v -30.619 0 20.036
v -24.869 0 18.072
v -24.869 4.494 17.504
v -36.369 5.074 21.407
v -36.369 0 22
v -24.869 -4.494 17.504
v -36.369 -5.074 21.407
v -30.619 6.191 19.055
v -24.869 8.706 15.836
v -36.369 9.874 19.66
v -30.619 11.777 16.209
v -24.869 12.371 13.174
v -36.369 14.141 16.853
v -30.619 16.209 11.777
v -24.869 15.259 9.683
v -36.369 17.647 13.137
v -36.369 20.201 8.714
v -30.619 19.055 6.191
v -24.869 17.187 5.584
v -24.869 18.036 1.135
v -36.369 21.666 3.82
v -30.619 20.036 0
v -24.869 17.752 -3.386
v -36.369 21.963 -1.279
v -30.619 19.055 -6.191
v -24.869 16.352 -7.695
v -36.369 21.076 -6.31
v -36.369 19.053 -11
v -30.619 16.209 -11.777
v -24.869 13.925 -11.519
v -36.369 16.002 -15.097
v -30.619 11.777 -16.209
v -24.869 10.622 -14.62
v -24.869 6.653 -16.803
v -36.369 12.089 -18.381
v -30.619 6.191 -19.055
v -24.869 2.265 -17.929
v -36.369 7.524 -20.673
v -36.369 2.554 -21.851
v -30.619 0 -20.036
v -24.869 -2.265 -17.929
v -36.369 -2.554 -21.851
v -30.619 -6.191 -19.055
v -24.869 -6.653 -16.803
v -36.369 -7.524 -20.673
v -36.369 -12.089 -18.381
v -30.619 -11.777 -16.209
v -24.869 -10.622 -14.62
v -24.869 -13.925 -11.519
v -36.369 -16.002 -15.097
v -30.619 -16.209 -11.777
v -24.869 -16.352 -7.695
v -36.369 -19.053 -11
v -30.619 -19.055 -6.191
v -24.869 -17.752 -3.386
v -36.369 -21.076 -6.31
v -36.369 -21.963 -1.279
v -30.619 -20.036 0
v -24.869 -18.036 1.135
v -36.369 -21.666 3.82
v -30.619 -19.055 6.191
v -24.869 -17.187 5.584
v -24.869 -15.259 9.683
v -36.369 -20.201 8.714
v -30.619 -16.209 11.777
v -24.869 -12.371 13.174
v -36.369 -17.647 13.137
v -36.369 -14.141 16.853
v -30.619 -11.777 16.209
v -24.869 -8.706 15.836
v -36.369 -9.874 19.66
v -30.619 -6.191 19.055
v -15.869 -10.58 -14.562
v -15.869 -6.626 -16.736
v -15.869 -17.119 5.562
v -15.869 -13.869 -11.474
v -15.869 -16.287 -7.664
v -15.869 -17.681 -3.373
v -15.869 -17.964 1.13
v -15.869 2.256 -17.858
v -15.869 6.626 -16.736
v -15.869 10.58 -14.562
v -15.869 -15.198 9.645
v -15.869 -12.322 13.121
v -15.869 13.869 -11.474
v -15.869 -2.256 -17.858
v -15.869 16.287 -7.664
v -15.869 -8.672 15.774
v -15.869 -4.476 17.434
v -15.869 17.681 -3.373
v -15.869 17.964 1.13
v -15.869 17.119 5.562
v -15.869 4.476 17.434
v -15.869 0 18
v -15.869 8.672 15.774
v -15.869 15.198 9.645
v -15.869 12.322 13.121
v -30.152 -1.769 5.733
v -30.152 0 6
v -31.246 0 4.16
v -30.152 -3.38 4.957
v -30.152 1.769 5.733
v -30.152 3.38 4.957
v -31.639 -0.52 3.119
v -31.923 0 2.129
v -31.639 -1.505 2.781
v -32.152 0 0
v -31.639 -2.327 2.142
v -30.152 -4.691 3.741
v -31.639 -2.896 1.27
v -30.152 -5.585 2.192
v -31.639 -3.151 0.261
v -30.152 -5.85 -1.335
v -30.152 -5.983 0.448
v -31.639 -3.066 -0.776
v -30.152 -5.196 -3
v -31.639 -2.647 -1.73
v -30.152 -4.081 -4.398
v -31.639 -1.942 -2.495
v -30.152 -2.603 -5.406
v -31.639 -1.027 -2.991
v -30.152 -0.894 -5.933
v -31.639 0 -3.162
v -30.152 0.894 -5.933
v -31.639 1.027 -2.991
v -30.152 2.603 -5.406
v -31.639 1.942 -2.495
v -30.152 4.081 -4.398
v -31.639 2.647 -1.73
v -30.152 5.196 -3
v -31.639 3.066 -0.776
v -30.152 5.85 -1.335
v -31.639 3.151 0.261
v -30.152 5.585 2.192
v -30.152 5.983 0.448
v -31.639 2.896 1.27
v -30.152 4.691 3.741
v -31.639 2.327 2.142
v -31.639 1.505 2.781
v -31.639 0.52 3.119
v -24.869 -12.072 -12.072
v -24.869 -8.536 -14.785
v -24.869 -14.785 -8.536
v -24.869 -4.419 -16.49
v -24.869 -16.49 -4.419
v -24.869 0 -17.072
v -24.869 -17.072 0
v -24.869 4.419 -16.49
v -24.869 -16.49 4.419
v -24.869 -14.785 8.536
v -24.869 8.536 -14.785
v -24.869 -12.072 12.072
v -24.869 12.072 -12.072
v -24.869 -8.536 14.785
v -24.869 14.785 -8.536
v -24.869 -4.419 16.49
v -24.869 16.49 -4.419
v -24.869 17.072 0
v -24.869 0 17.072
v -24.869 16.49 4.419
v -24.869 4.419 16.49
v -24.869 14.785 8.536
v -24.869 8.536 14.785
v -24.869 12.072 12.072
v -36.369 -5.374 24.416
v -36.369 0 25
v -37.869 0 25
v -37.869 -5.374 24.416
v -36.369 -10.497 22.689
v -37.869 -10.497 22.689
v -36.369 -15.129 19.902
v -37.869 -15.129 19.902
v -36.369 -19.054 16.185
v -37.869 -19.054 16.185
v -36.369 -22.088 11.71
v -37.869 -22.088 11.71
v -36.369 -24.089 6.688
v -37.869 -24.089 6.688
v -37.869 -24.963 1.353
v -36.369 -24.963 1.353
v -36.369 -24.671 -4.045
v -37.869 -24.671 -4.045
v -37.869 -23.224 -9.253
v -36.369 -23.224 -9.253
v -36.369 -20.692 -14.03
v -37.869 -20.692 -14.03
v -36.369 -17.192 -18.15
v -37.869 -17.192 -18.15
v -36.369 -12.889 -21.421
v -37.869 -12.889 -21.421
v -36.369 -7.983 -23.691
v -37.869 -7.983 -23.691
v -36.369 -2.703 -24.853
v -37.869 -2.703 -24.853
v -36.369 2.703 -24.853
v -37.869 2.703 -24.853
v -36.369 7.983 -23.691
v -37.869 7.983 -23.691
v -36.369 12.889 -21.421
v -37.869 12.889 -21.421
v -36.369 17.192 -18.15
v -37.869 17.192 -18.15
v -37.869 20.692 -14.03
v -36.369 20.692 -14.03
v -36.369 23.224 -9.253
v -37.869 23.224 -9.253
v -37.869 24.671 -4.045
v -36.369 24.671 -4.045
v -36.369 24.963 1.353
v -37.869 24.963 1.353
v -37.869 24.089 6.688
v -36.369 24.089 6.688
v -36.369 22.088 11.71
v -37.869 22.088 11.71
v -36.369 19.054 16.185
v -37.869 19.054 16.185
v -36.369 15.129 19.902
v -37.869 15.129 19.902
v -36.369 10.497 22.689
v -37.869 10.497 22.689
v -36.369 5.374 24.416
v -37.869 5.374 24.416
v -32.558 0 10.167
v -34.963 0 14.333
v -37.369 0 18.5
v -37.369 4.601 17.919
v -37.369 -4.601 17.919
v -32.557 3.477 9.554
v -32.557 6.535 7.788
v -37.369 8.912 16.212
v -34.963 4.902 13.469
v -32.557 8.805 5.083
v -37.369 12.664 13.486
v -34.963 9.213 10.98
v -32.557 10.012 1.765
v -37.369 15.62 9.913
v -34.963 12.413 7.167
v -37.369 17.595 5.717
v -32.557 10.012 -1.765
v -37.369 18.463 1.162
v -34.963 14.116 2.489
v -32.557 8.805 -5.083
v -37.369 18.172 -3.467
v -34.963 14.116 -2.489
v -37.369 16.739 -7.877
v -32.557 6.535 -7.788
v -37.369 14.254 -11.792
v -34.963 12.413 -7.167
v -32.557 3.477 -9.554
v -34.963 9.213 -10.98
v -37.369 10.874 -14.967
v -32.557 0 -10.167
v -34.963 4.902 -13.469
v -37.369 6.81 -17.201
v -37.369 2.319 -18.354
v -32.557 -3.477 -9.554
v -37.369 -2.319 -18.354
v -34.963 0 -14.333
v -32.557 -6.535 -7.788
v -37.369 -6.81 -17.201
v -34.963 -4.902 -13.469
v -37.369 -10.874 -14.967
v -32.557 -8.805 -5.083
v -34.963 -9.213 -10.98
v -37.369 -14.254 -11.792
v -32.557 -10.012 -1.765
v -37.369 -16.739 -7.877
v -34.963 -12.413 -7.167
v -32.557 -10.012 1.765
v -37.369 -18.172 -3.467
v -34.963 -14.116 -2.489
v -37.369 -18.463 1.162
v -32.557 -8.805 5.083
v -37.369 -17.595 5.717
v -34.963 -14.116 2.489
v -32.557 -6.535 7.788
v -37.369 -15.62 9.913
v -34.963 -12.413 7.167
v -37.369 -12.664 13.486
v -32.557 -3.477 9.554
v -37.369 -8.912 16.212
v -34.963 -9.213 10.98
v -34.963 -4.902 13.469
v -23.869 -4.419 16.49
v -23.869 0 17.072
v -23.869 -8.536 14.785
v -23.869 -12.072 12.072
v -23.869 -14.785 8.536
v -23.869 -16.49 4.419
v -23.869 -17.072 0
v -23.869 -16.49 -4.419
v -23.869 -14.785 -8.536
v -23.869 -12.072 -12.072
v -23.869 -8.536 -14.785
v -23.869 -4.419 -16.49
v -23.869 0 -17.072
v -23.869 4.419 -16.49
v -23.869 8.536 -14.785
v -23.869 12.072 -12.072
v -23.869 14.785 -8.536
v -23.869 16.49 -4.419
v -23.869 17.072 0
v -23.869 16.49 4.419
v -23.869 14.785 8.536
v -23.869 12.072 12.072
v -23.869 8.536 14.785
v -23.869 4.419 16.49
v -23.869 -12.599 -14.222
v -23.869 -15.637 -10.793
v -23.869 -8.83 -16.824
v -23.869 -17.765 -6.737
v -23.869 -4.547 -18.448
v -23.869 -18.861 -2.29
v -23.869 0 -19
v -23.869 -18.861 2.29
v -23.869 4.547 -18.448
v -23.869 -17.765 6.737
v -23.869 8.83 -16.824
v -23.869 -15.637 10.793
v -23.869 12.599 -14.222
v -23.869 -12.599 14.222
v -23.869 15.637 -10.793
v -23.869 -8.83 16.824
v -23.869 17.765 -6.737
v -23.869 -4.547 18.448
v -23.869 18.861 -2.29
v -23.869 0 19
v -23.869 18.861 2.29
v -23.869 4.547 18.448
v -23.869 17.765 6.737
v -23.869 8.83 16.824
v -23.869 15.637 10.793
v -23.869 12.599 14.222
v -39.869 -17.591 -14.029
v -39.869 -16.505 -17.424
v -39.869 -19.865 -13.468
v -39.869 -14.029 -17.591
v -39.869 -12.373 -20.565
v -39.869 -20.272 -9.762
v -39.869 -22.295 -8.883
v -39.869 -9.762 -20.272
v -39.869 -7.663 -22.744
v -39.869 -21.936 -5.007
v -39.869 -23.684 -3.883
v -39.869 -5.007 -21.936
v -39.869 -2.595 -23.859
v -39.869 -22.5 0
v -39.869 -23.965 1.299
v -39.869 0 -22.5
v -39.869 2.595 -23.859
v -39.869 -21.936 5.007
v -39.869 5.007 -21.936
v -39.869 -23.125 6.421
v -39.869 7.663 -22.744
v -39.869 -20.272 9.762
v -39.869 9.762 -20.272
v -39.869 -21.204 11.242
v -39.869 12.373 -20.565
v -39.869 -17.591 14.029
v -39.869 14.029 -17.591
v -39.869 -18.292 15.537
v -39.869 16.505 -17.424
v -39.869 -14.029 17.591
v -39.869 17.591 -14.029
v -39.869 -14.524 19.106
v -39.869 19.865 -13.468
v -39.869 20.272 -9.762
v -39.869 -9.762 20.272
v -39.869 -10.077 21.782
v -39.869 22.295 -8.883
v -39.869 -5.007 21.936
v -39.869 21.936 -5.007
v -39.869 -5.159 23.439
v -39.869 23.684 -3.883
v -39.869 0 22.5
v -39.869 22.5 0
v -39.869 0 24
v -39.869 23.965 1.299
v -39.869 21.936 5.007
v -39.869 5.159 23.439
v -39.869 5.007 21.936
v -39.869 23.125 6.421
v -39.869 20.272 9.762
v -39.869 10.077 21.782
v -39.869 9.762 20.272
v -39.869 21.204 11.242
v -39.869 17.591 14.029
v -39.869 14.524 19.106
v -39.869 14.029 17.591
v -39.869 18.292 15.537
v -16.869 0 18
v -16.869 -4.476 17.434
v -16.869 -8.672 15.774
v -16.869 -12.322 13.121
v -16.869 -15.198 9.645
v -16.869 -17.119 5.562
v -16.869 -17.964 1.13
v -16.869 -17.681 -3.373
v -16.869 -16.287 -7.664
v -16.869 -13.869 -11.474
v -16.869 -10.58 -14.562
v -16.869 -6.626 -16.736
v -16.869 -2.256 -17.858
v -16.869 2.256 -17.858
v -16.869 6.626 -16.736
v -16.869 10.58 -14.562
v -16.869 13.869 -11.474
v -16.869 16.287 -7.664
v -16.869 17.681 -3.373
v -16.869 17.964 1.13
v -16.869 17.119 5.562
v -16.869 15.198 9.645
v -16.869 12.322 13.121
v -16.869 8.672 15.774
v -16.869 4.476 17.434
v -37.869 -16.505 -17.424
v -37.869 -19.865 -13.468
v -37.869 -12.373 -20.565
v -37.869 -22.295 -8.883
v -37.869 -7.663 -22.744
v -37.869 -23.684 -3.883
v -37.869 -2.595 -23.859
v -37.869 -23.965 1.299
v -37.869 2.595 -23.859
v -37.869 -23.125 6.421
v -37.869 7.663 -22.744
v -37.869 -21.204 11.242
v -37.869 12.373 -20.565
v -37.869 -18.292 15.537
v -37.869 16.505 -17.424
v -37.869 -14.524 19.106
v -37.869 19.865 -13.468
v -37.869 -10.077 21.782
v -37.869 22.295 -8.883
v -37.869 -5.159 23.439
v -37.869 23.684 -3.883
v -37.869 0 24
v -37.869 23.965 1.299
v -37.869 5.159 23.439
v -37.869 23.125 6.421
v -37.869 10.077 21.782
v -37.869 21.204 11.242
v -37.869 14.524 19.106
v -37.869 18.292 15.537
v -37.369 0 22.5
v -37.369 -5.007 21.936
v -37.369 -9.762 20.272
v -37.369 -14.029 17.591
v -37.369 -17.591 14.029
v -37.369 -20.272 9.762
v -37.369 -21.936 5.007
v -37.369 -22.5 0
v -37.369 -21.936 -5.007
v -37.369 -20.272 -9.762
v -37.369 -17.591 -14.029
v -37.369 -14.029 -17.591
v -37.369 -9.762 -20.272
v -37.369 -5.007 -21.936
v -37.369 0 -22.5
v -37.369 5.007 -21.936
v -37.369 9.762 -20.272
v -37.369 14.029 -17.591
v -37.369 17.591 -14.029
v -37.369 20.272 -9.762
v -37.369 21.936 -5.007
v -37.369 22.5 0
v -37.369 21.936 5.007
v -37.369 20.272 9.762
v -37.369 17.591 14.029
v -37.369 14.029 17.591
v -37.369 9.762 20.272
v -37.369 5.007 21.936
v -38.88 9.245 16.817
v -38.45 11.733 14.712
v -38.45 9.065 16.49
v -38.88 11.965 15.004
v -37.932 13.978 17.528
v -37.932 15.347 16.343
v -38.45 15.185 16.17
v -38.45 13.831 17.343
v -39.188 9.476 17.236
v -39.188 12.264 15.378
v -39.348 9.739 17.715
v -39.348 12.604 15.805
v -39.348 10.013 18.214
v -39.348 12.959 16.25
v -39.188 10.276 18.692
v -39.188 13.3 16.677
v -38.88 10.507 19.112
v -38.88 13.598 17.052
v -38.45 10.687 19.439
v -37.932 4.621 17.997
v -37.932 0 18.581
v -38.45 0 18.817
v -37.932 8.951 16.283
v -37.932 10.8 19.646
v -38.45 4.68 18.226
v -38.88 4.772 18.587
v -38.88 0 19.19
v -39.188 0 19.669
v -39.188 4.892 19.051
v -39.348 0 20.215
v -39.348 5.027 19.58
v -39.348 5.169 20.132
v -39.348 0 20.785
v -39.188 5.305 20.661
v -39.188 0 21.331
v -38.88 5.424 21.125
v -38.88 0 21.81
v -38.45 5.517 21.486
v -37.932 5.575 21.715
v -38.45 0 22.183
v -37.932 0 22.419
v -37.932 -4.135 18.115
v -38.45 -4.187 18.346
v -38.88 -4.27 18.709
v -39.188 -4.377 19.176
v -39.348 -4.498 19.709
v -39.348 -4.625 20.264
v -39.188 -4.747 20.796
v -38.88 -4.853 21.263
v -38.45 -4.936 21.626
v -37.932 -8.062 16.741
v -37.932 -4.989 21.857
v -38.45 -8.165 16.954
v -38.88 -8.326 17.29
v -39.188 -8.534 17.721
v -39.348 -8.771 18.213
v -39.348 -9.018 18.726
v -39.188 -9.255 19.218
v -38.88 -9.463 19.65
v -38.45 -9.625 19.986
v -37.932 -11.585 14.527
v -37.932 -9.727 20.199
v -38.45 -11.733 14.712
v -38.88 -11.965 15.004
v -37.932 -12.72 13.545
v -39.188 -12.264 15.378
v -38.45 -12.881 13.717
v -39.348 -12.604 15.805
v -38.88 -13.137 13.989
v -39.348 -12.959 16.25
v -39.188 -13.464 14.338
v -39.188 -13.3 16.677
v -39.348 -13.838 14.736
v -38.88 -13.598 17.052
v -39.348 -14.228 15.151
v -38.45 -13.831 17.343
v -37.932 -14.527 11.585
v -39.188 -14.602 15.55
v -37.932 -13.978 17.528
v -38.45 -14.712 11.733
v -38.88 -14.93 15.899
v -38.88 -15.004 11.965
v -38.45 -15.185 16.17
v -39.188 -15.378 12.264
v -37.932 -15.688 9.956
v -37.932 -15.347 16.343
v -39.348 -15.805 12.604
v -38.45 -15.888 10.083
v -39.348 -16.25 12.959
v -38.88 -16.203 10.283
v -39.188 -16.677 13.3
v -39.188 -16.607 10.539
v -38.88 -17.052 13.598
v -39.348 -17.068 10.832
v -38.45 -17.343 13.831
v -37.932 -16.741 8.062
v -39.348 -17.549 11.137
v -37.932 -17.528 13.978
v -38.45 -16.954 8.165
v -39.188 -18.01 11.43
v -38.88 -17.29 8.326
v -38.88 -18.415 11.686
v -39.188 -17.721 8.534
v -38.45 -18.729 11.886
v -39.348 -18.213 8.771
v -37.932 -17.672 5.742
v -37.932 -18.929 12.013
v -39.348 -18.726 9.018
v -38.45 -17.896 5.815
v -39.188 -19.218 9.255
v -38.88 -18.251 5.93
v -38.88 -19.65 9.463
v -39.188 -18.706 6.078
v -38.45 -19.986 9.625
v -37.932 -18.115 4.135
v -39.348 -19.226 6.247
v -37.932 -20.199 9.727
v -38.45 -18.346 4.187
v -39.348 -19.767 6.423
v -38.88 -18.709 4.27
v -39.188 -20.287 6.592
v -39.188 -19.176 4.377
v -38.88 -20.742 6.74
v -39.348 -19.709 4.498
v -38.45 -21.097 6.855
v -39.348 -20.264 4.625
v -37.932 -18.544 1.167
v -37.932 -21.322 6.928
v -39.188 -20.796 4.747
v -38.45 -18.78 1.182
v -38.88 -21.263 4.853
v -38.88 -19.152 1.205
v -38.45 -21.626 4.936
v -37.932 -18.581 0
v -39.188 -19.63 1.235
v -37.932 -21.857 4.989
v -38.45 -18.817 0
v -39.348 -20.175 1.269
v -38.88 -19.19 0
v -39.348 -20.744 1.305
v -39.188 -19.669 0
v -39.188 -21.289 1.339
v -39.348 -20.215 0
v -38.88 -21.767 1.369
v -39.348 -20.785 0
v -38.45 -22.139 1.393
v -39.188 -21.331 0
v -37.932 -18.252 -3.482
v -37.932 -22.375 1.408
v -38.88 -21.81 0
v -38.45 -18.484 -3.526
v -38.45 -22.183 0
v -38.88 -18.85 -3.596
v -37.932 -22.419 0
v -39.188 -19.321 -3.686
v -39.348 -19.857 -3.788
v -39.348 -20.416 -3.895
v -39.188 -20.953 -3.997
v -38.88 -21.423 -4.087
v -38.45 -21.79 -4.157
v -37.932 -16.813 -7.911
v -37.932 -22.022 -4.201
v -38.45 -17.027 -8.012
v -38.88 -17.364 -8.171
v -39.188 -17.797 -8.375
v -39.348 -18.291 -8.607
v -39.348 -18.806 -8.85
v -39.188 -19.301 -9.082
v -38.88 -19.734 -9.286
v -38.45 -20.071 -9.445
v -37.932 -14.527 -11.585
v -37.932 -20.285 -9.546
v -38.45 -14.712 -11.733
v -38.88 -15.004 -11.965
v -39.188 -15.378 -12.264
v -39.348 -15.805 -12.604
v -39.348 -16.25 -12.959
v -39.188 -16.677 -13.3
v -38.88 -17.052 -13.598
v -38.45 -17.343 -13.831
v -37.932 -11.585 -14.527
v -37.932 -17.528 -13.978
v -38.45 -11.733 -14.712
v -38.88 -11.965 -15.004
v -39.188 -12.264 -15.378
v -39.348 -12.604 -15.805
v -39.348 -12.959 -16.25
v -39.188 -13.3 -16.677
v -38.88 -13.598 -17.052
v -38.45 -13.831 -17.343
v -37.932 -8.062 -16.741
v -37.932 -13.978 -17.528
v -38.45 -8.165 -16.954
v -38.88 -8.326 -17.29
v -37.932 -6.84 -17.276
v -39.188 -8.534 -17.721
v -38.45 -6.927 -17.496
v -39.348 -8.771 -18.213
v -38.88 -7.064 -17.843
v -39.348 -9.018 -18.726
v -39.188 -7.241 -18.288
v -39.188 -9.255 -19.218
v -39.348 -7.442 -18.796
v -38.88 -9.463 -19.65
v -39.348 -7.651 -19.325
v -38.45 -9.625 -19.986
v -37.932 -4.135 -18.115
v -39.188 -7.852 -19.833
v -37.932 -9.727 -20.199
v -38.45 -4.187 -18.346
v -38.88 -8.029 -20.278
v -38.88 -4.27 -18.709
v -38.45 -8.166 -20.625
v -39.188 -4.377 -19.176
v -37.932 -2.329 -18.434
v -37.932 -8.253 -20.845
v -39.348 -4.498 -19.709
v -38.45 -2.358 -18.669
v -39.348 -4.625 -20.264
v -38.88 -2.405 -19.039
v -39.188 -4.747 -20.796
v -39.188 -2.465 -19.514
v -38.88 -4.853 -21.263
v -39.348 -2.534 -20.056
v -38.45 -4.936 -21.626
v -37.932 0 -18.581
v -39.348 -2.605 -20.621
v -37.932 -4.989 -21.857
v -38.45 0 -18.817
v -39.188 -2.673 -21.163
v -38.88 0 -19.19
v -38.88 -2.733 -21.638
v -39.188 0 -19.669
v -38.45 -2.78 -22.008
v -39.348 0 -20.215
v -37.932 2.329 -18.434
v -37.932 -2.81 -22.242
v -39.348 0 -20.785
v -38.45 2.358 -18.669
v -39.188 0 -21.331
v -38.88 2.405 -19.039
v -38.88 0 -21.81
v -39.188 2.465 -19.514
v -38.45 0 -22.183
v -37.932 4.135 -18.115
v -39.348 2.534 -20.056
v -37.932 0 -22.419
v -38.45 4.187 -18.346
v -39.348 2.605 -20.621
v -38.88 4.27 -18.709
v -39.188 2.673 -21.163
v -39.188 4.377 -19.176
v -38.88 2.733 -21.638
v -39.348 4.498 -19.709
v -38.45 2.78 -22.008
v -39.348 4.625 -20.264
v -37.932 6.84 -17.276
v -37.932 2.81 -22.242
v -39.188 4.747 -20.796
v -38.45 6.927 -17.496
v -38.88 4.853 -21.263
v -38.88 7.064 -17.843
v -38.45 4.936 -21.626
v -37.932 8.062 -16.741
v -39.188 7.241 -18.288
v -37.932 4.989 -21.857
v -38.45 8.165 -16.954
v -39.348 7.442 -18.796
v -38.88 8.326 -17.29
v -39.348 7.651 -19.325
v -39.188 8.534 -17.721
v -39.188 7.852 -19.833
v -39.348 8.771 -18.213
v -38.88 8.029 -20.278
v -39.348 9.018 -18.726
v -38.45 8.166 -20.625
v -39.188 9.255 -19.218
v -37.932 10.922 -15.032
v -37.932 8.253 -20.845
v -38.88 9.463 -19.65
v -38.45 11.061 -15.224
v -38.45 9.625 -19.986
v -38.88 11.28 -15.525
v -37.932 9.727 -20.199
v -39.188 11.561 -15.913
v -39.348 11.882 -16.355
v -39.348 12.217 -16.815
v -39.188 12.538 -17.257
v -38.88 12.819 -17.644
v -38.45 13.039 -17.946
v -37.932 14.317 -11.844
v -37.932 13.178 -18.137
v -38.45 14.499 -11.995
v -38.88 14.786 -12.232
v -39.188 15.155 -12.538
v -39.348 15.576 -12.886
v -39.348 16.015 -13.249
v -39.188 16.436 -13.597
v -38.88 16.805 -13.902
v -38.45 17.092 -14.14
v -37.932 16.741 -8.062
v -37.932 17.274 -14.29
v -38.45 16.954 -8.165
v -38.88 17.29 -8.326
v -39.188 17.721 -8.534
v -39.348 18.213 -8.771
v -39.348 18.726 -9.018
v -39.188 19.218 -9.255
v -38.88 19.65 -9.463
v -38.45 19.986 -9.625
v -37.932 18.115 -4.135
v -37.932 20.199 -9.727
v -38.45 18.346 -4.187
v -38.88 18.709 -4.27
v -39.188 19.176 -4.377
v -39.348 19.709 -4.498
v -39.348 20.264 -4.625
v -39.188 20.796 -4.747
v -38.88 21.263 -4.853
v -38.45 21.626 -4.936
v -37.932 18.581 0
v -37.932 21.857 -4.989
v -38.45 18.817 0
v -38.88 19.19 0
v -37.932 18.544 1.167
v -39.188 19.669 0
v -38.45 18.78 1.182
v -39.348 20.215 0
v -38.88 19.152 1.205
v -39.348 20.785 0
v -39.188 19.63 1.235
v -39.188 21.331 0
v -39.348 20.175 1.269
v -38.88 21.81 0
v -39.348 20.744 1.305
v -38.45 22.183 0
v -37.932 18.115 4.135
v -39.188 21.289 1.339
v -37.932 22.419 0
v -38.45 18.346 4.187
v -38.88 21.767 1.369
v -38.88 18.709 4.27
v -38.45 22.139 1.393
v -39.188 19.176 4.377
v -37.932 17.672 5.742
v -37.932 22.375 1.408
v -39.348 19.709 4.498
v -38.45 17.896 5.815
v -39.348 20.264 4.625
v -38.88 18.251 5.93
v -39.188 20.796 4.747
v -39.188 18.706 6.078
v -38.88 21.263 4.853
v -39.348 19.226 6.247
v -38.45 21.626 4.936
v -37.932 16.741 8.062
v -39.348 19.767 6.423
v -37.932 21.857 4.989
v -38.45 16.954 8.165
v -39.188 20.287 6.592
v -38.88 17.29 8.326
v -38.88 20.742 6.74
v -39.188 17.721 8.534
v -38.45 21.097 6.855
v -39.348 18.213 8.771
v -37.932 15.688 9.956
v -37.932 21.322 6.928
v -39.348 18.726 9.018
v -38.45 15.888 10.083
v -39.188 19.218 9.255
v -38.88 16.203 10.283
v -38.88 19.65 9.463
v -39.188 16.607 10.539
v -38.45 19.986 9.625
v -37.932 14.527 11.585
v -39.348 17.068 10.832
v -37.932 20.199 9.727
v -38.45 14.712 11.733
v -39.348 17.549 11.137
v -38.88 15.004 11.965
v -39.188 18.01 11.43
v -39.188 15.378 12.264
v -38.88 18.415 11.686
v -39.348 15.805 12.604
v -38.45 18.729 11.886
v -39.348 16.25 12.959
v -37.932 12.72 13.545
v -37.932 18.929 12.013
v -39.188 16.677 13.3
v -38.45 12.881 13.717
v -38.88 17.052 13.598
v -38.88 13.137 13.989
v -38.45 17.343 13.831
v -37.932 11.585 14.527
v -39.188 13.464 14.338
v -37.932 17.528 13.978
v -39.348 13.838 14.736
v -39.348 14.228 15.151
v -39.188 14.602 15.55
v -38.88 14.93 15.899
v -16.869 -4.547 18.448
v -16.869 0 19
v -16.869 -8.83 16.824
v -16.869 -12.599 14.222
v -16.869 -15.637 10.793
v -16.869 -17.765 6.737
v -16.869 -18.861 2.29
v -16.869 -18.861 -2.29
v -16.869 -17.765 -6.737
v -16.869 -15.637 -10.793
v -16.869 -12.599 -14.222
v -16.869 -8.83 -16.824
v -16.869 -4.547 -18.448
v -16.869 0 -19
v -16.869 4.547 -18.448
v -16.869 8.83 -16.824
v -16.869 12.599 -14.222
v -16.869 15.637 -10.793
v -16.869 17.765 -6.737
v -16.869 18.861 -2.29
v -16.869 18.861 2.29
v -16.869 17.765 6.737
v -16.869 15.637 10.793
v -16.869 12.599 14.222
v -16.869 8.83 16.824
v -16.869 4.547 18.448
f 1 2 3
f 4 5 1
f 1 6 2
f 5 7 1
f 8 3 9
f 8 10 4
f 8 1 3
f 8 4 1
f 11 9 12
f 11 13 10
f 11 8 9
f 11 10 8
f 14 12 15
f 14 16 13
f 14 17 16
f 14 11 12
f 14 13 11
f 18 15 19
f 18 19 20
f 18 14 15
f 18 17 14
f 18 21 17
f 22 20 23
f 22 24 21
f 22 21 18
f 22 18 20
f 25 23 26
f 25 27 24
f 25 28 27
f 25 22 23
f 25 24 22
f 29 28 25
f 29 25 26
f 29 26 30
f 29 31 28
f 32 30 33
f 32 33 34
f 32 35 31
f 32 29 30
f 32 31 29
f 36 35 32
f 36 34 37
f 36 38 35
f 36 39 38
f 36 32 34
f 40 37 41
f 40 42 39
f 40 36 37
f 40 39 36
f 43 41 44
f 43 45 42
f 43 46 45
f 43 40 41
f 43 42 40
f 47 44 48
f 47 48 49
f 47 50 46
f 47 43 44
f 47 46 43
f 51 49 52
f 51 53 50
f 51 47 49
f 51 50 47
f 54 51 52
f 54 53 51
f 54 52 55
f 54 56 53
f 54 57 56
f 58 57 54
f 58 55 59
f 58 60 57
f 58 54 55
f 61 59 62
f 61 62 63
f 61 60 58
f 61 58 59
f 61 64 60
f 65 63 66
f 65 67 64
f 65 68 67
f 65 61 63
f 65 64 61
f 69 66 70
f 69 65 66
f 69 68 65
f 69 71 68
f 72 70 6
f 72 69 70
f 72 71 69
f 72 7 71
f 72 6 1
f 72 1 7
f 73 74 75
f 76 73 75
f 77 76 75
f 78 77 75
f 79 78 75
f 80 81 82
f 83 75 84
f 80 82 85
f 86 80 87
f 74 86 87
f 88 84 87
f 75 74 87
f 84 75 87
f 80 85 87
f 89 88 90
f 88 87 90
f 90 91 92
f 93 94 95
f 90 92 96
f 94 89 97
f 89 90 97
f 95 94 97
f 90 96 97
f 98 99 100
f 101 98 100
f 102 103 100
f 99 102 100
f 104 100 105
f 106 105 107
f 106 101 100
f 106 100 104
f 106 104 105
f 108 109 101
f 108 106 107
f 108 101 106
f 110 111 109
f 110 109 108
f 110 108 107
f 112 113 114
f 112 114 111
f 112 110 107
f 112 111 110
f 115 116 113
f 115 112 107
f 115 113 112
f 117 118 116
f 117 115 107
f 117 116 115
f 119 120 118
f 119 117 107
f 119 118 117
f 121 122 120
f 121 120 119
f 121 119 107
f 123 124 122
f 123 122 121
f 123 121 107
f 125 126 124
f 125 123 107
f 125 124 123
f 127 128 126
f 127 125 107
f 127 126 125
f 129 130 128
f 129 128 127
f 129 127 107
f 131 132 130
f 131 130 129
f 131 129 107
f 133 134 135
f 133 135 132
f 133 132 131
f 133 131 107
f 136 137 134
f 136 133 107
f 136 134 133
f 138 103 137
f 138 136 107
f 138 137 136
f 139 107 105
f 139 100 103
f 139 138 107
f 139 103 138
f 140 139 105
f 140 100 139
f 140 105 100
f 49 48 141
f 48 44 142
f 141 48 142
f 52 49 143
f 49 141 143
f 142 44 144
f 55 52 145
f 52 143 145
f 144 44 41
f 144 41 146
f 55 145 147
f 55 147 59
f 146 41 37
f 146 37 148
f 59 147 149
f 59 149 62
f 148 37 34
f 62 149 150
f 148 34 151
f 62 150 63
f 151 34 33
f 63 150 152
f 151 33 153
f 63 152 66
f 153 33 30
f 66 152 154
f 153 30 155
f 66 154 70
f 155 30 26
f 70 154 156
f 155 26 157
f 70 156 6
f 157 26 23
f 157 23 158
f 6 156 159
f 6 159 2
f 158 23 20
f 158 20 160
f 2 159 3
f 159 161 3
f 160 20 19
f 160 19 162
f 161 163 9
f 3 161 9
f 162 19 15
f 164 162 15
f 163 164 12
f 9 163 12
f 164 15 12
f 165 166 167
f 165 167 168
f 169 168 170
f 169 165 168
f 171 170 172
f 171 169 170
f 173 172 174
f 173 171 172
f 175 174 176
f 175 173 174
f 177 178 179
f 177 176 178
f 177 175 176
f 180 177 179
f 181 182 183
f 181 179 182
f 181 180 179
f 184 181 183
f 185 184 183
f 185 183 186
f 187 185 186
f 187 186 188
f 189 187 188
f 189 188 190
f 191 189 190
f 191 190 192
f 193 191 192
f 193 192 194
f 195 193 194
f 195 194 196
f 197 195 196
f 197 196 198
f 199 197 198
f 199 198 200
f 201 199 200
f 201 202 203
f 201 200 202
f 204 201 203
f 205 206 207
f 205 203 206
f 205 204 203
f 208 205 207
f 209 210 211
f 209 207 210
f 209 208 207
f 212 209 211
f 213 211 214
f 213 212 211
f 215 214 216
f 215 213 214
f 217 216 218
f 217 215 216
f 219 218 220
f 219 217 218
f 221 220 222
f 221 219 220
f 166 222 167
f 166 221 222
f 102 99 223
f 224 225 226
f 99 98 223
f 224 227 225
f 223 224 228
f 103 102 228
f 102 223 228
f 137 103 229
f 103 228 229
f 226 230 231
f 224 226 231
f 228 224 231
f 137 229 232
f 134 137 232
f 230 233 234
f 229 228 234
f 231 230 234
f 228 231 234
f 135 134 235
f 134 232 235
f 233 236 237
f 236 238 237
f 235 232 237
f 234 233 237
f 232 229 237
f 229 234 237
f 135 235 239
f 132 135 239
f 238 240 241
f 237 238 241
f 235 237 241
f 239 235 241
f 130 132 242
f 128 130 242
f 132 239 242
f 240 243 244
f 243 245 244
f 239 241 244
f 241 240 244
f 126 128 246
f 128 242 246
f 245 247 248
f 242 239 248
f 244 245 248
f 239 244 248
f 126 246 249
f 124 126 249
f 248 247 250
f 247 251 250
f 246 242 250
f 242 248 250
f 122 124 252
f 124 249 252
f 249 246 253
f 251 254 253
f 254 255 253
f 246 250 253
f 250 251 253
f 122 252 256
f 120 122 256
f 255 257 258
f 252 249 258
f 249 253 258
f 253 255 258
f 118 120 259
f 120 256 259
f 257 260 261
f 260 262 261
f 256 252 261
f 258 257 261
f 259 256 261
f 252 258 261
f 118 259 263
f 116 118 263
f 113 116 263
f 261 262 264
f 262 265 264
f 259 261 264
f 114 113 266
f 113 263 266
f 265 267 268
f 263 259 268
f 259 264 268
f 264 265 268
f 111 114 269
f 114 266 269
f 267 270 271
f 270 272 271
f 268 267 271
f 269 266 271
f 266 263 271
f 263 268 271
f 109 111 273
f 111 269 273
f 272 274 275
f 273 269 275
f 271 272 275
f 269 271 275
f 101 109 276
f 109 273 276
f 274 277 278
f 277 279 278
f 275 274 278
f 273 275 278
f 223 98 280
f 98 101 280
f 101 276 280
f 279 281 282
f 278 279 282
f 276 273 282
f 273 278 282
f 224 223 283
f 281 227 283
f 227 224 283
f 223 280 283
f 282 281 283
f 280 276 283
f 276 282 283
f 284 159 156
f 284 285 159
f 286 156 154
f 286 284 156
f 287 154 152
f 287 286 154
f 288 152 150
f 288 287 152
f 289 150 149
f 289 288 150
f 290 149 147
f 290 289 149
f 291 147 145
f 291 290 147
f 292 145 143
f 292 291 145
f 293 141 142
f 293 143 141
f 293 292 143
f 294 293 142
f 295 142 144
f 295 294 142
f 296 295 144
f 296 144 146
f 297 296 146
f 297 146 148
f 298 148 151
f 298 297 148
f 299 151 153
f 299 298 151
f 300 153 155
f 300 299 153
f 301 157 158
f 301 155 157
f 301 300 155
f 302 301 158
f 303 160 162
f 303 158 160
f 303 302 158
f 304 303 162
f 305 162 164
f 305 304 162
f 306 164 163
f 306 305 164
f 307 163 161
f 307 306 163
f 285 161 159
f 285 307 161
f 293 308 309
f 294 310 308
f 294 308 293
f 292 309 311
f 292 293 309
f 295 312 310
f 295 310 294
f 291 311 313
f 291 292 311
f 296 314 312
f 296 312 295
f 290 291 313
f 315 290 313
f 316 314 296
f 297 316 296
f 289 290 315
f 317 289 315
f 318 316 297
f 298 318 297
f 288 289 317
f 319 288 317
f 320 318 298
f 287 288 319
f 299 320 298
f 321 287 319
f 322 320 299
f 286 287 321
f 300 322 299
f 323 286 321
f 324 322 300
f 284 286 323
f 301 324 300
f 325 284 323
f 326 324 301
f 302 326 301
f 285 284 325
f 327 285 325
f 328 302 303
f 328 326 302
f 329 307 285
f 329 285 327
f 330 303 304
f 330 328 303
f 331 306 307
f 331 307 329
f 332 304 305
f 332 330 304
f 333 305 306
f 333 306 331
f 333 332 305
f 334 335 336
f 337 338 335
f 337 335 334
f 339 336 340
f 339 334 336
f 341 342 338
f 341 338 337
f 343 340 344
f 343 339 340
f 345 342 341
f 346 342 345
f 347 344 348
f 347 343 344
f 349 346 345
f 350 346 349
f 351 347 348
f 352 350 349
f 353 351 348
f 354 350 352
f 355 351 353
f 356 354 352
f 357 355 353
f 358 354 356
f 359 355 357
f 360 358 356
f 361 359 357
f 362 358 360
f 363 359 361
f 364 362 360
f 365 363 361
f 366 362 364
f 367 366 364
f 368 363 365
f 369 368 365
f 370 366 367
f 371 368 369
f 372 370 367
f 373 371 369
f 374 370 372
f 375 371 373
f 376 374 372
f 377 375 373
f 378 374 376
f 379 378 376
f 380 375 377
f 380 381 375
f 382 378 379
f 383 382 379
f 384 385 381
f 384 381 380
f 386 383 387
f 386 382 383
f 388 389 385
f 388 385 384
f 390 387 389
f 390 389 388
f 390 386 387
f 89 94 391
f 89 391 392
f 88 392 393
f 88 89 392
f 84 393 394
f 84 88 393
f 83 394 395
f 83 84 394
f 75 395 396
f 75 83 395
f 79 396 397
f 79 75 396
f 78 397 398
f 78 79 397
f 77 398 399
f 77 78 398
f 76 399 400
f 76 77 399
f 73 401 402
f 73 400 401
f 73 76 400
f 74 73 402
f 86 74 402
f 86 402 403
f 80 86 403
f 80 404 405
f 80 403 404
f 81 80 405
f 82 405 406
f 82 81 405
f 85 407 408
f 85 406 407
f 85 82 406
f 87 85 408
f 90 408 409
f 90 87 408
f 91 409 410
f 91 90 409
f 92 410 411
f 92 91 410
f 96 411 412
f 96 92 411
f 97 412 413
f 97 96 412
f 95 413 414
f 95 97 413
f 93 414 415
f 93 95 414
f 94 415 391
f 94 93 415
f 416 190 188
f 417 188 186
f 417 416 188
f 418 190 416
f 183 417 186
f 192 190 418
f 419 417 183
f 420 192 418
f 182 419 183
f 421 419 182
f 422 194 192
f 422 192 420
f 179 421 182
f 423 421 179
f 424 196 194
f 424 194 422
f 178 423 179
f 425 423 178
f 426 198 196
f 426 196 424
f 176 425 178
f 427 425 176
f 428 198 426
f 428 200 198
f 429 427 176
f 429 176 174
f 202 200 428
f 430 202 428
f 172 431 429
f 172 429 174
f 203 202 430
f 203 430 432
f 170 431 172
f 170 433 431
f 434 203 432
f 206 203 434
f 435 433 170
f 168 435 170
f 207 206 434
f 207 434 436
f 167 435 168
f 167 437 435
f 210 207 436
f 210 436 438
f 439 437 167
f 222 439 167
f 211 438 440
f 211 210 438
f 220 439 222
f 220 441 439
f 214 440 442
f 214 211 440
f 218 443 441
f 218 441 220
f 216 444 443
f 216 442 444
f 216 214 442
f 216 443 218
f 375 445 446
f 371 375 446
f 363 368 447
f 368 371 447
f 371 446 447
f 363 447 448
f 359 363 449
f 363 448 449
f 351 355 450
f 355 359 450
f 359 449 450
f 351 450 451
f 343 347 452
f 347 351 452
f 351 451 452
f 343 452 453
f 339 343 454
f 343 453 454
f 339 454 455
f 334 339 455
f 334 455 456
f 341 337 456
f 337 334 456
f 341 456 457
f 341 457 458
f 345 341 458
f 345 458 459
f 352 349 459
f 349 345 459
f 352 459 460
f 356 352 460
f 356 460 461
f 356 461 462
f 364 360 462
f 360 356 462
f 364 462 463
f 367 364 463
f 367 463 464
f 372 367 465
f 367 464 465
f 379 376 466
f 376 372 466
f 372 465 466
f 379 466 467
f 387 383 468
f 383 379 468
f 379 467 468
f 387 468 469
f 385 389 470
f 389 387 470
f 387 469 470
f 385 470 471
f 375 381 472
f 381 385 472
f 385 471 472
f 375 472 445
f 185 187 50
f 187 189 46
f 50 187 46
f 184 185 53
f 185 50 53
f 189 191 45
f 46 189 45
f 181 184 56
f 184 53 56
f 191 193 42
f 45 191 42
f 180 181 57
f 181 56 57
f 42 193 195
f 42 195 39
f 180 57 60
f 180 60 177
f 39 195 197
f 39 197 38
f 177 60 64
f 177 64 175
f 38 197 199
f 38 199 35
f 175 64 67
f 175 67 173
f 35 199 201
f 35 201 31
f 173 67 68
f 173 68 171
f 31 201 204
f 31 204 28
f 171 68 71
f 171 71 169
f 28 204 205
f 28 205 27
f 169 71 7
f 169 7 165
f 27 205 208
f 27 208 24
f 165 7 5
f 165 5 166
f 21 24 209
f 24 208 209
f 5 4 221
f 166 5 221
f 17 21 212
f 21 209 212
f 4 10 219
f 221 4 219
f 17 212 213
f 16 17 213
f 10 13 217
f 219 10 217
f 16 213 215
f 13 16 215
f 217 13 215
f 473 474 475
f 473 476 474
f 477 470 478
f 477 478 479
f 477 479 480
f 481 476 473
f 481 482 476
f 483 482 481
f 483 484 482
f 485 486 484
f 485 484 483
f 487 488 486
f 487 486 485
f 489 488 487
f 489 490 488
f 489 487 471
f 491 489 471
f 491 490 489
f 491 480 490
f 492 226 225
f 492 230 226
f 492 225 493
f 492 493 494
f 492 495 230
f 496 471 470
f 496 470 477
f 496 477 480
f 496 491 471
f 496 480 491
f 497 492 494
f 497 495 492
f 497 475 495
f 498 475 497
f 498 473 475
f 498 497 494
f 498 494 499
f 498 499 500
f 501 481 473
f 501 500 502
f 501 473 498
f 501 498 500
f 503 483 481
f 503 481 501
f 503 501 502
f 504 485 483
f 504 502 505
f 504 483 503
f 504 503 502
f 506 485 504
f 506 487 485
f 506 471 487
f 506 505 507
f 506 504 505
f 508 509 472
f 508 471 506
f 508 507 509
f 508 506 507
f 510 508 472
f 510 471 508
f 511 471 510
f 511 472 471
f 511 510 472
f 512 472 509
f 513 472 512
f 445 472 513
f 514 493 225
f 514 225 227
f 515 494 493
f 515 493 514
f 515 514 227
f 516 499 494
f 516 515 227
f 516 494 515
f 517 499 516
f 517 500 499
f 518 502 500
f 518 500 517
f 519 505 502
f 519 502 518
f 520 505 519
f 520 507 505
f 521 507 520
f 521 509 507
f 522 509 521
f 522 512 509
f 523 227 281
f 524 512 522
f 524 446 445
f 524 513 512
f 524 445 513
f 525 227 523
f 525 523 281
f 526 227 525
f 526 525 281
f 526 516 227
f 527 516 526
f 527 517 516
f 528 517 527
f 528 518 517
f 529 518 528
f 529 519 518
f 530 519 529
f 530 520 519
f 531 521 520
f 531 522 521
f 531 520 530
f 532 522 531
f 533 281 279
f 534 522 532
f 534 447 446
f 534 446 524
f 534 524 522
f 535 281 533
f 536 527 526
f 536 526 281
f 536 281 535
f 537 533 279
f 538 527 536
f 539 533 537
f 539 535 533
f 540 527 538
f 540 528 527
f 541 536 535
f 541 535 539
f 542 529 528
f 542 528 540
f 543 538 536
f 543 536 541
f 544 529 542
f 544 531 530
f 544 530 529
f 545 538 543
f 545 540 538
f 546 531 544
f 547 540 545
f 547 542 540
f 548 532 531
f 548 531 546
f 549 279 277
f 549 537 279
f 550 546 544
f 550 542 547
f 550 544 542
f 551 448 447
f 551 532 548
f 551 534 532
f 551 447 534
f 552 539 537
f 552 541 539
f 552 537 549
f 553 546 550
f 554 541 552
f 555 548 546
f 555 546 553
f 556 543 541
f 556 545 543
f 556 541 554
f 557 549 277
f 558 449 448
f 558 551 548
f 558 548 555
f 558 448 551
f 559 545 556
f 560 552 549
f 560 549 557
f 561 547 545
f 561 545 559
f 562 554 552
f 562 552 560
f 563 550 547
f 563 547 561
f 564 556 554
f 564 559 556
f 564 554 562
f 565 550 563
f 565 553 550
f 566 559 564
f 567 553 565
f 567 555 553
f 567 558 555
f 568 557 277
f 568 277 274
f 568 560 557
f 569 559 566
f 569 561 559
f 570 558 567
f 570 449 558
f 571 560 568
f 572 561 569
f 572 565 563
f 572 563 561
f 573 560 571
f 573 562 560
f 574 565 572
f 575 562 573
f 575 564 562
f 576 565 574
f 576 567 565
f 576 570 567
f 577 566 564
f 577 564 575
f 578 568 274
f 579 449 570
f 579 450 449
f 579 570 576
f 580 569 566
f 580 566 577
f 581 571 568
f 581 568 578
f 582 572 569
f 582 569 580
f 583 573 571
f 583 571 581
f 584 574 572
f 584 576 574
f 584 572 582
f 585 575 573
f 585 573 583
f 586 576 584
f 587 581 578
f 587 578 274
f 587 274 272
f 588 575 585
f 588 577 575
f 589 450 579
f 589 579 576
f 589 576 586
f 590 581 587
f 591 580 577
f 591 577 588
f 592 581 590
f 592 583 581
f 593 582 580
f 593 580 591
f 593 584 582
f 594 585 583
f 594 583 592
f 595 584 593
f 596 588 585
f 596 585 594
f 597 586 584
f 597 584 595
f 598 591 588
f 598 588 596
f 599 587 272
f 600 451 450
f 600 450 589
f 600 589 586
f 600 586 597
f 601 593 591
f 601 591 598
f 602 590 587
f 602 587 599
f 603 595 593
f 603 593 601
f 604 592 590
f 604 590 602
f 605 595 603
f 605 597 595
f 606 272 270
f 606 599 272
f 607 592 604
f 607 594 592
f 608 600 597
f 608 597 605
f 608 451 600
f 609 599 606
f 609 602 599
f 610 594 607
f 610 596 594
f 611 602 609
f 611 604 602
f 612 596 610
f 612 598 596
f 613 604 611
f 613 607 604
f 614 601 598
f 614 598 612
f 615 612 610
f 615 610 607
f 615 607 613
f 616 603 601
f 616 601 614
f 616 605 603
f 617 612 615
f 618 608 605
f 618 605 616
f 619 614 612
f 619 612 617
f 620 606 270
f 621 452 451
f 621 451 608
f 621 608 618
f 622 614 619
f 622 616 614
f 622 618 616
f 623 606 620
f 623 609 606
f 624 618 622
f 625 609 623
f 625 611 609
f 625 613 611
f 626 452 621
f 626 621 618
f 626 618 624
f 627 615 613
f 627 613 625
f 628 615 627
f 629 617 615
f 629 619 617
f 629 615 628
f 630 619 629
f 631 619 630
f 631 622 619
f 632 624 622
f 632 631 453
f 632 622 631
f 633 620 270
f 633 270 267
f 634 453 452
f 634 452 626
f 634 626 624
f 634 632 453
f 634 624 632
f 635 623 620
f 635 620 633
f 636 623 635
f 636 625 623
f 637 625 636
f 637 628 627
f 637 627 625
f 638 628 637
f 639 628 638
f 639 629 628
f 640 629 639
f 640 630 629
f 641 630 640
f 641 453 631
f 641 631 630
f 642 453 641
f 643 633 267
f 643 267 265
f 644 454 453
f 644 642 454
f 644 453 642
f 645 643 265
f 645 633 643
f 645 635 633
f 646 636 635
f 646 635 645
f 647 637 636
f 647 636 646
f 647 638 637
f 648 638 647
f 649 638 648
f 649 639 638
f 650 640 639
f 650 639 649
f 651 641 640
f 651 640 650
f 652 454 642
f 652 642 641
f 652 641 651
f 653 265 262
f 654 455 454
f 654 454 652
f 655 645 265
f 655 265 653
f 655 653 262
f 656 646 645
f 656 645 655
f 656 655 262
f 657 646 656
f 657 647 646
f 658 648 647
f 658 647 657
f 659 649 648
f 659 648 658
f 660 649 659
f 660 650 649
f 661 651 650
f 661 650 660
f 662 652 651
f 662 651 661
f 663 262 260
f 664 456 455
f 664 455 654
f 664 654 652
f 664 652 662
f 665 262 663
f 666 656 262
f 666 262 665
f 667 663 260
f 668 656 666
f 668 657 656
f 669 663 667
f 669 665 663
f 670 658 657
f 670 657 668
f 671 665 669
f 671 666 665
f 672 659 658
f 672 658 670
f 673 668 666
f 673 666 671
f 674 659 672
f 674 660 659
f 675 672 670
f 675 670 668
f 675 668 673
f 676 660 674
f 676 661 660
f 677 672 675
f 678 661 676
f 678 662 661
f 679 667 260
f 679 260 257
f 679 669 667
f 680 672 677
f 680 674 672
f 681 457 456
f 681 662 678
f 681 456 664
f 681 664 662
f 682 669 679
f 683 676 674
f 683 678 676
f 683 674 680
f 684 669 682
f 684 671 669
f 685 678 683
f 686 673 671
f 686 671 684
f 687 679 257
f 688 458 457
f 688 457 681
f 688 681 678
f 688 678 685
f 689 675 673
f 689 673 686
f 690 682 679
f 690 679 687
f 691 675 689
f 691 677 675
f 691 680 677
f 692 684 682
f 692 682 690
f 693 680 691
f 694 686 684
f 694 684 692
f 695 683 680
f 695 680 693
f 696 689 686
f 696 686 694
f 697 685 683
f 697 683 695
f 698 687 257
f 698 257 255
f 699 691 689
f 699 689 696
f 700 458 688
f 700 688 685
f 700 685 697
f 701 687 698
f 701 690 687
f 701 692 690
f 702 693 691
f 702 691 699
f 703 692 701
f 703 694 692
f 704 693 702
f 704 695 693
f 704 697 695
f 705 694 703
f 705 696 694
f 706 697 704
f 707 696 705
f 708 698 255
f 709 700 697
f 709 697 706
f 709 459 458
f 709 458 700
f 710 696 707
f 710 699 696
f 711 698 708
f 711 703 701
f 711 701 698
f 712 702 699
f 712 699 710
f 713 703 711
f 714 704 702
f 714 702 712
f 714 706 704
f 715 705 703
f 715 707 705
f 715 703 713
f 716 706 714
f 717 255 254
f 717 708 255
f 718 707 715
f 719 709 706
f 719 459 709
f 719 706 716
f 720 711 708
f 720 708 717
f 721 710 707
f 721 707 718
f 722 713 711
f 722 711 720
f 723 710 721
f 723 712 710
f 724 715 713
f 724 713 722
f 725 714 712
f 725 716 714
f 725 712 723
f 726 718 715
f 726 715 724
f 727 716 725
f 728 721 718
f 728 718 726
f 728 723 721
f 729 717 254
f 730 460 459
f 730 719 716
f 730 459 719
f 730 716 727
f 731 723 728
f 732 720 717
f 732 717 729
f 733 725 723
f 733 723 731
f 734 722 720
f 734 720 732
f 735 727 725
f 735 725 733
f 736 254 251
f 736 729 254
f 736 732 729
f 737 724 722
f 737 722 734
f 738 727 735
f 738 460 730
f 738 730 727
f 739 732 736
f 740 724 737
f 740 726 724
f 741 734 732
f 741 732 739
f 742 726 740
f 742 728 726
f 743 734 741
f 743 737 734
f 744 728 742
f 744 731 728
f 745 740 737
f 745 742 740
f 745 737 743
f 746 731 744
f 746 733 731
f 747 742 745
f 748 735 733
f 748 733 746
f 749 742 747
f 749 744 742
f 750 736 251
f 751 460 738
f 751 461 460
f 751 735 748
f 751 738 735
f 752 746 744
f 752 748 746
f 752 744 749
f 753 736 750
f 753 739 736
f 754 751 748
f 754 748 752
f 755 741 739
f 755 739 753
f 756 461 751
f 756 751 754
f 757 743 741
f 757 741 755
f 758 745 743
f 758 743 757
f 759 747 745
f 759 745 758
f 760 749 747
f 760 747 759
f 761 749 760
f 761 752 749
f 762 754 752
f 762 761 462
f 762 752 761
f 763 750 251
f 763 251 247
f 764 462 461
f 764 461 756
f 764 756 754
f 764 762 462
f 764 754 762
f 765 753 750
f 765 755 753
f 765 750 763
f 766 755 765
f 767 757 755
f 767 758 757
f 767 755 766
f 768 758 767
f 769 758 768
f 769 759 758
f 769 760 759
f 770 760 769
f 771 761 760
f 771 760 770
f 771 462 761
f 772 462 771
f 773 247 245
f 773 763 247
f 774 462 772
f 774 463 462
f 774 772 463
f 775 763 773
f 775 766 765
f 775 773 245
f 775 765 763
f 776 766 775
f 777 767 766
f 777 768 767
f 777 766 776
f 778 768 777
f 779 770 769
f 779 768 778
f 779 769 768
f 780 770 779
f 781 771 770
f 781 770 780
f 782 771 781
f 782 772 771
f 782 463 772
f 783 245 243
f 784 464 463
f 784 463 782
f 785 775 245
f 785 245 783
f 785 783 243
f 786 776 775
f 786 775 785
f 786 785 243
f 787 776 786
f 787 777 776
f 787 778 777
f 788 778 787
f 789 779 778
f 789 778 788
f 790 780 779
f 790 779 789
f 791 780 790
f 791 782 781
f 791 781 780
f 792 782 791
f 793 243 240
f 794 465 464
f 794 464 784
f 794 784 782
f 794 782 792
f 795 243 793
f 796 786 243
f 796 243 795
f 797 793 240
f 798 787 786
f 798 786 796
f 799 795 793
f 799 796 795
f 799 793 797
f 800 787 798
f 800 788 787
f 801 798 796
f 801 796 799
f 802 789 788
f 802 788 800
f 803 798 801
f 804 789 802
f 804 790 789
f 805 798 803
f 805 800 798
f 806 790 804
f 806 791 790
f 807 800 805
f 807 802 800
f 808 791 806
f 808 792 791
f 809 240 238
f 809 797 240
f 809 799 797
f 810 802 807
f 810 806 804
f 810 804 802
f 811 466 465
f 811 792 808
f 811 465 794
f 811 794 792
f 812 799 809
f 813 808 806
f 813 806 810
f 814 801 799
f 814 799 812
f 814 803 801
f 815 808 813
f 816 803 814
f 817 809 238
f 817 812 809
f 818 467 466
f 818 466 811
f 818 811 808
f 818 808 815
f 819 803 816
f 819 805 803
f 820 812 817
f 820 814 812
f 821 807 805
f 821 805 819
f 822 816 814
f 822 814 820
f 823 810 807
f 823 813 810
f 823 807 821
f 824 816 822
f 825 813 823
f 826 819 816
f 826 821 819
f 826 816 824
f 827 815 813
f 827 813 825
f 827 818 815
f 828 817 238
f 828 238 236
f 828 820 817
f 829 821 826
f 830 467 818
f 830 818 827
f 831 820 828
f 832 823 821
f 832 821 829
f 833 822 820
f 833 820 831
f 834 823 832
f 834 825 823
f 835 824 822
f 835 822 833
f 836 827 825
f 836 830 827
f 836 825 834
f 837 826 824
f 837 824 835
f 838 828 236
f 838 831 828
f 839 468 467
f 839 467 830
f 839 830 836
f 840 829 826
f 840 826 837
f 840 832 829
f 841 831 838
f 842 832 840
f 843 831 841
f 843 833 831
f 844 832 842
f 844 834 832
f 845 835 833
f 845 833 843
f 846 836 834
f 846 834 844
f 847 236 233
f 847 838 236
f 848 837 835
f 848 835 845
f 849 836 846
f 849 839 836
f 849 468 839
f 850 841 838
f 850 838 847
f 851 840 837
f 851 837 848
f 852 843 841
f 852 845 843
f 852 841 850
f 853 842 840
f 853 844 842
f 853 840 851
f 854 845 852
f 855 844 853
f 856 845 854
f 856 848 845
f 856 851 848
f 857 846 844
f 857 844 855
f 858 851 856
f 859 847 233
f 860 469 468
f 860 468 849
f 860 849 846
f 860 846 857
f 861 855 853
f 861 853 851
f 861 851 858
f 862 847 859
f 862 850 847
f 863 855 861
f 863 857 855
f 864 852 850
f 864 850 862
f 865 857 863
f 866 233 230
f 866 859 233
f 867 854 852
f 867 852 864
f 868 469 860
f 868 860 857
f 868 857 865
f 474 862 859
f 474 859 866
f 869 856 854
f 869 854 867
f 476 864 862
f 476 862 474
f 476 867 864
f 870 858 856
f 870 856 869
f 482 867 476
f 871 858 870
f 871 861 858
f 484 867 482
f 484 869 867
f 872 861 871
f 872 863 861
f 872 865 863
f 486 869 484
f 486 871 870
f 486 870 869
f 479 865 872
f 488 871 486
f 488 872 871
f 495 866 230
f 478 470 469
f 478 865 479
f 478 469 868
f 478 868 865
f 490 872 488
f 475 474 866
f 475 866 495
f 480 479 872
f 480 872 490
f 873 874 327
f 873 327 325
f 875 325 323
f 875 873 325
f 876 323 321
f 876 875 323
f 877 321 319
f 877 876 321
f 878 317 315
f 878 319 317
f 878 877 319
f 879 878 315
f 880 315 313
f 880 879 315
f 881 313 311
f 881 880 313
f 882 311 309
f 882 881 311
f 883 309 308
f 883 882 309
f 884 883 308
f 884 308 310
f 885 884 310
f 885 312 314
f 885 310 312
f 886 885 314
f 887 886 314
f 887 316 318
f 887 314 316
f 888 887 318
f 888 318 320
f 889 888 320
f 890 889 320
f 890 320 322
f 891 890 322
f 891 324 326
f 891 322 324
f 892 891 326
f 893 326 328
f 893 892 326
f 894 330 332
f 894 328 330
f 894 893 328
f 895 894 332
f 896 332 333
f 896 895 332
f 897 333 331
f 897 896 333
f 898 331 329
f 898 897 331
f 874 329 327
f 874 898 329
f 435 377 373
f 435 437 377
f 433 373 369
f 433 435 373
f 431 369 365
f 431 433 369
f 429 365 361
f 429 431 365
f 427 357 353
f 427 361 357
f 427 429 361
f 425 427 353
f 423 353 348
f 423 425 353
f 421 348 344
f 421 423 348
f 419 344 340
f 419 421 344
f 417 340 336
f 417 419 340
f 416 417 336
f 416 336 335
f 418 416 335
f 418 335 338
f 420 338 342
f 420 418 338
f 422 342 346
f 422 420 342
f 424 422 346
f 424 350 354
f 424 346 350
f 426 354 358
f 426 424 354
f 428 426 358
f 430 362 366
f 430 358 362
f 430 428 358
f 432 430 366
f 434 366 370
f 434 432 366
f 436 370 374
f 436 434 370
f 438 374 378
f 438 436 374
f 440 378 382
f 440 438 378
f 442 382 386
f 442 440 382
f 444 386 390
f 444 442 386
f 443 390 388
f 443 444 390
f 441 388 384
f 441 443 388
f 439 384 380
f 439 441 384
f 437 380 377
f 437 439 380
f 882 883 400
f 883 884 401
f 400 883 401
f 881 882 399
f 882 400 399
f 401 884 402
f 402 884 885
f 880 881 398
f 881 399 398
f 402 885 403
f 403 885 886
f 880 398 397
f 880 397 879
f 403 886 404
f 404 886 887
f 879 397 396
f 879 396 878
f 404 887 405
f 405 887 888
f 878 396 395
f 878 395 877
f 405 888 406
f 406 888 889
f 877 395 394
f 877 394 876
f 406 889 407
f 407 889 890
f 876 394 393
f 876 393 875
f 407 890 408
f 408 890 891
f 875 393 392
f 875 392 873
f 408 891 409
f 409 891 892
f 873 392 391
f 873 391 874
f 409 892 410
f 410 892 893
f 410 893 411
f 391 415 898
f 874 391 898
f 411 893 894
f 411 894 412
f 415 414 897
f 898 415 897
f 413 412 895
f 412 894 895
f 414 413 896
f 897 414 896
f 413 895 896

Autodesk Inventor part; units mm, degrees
ref_plane "YZ Plane" through (0, 0, 0) normal (1, 0, 0) x (0, 1, 0)
ref_plane "XZ Plane" through (0, 0, 0) normal (0, 1, 0) x (-1, 0, 0)
ref_plane "XY Plane" through (0, 0, 0) normal (0, 0, 1) x (1, 0, 0)
sketch "Skizze1" plane through (0, 0, 0) normal (0, 1, 0) x (-1, 0, 0)
  line L0 (39.8687, 22.5) -> (39.8687, 24)
  line L1 (39.8687, 24) -> (37.8687, 24)
  line L2 (37.8687, 24) -> (37.8687, 25)
  line L3 (37.8687, 25) -> (36.3687, 25)
  line L4 (36.3687, 22) -> (24.8687, 18.0718)
  line L5 (24.8687, 18.0718) -> (24.8687, 17.0718)
  line L6 (24.8687, 17.0718) -> (23.8687, 17.0718)
  line L7 (23.8687, 17.0718) -> (23.8687, 19)
  line L8 (23.8687, 19) -> (16.8687, 19)
  line L9 (16.8687, 19) -> (16.8687, 18)
  line L10 (16.8687, 18) -> (15.8687, 18)
  line L11 (15.8687, 18) -> (15.8687, 0)
  line L12 (39.8687, 22.5) -> (37.3687, 22.5)
  arc A0 (37.3687, 18.5) -> (37.3687, 22.5) centre (37.3687, 20.5) ccw
  line L13 (37.3687, 18.5) -> (30.1519, 6)
  arc A1 (32.1519, 0) -> (30.1519, 6) centre (22.1519, 0) ccw
  line L14 (0, -5) -> (0, 30) construction
  line L15 (-7.9737, 0) -> (47.8425, 0) construction
  line L16 (37.3687, 22.5) -> (37.3687, 18.5) construction
  line L17 (32.1519, 0) -> (15.8687, 0)
  line L18 (36.3687, 25) -> (36.3687, 22)
  point P0 (0, 0)
  dimension "d1" = 2
  dimension "d2" = 30
  dimension "d3" = 6
  dimension "d4" = 22.5
  dimension "d5" = 24
  dimension "d6" = 2
  dimension "d7" = 1
  dimension "d8" = 24
  dimension "d10" = 18
  dimension "d11" = 7
  dimension "d13" = 1
  dimension "d14" = 1
  dimension "d16" = 1
  dimension "d17" = 1.5
  dimension "d18" = 2
  dimension "d19" = 2.5
  dimension "d20" = 1
  dimension "d23" = 3
revolve "Umdrehung1" add sketch "Skizze1" angle 360 about axis through (0, 0, 0) along (-1, 0, 0)
properties part number "Loudspeaker"
